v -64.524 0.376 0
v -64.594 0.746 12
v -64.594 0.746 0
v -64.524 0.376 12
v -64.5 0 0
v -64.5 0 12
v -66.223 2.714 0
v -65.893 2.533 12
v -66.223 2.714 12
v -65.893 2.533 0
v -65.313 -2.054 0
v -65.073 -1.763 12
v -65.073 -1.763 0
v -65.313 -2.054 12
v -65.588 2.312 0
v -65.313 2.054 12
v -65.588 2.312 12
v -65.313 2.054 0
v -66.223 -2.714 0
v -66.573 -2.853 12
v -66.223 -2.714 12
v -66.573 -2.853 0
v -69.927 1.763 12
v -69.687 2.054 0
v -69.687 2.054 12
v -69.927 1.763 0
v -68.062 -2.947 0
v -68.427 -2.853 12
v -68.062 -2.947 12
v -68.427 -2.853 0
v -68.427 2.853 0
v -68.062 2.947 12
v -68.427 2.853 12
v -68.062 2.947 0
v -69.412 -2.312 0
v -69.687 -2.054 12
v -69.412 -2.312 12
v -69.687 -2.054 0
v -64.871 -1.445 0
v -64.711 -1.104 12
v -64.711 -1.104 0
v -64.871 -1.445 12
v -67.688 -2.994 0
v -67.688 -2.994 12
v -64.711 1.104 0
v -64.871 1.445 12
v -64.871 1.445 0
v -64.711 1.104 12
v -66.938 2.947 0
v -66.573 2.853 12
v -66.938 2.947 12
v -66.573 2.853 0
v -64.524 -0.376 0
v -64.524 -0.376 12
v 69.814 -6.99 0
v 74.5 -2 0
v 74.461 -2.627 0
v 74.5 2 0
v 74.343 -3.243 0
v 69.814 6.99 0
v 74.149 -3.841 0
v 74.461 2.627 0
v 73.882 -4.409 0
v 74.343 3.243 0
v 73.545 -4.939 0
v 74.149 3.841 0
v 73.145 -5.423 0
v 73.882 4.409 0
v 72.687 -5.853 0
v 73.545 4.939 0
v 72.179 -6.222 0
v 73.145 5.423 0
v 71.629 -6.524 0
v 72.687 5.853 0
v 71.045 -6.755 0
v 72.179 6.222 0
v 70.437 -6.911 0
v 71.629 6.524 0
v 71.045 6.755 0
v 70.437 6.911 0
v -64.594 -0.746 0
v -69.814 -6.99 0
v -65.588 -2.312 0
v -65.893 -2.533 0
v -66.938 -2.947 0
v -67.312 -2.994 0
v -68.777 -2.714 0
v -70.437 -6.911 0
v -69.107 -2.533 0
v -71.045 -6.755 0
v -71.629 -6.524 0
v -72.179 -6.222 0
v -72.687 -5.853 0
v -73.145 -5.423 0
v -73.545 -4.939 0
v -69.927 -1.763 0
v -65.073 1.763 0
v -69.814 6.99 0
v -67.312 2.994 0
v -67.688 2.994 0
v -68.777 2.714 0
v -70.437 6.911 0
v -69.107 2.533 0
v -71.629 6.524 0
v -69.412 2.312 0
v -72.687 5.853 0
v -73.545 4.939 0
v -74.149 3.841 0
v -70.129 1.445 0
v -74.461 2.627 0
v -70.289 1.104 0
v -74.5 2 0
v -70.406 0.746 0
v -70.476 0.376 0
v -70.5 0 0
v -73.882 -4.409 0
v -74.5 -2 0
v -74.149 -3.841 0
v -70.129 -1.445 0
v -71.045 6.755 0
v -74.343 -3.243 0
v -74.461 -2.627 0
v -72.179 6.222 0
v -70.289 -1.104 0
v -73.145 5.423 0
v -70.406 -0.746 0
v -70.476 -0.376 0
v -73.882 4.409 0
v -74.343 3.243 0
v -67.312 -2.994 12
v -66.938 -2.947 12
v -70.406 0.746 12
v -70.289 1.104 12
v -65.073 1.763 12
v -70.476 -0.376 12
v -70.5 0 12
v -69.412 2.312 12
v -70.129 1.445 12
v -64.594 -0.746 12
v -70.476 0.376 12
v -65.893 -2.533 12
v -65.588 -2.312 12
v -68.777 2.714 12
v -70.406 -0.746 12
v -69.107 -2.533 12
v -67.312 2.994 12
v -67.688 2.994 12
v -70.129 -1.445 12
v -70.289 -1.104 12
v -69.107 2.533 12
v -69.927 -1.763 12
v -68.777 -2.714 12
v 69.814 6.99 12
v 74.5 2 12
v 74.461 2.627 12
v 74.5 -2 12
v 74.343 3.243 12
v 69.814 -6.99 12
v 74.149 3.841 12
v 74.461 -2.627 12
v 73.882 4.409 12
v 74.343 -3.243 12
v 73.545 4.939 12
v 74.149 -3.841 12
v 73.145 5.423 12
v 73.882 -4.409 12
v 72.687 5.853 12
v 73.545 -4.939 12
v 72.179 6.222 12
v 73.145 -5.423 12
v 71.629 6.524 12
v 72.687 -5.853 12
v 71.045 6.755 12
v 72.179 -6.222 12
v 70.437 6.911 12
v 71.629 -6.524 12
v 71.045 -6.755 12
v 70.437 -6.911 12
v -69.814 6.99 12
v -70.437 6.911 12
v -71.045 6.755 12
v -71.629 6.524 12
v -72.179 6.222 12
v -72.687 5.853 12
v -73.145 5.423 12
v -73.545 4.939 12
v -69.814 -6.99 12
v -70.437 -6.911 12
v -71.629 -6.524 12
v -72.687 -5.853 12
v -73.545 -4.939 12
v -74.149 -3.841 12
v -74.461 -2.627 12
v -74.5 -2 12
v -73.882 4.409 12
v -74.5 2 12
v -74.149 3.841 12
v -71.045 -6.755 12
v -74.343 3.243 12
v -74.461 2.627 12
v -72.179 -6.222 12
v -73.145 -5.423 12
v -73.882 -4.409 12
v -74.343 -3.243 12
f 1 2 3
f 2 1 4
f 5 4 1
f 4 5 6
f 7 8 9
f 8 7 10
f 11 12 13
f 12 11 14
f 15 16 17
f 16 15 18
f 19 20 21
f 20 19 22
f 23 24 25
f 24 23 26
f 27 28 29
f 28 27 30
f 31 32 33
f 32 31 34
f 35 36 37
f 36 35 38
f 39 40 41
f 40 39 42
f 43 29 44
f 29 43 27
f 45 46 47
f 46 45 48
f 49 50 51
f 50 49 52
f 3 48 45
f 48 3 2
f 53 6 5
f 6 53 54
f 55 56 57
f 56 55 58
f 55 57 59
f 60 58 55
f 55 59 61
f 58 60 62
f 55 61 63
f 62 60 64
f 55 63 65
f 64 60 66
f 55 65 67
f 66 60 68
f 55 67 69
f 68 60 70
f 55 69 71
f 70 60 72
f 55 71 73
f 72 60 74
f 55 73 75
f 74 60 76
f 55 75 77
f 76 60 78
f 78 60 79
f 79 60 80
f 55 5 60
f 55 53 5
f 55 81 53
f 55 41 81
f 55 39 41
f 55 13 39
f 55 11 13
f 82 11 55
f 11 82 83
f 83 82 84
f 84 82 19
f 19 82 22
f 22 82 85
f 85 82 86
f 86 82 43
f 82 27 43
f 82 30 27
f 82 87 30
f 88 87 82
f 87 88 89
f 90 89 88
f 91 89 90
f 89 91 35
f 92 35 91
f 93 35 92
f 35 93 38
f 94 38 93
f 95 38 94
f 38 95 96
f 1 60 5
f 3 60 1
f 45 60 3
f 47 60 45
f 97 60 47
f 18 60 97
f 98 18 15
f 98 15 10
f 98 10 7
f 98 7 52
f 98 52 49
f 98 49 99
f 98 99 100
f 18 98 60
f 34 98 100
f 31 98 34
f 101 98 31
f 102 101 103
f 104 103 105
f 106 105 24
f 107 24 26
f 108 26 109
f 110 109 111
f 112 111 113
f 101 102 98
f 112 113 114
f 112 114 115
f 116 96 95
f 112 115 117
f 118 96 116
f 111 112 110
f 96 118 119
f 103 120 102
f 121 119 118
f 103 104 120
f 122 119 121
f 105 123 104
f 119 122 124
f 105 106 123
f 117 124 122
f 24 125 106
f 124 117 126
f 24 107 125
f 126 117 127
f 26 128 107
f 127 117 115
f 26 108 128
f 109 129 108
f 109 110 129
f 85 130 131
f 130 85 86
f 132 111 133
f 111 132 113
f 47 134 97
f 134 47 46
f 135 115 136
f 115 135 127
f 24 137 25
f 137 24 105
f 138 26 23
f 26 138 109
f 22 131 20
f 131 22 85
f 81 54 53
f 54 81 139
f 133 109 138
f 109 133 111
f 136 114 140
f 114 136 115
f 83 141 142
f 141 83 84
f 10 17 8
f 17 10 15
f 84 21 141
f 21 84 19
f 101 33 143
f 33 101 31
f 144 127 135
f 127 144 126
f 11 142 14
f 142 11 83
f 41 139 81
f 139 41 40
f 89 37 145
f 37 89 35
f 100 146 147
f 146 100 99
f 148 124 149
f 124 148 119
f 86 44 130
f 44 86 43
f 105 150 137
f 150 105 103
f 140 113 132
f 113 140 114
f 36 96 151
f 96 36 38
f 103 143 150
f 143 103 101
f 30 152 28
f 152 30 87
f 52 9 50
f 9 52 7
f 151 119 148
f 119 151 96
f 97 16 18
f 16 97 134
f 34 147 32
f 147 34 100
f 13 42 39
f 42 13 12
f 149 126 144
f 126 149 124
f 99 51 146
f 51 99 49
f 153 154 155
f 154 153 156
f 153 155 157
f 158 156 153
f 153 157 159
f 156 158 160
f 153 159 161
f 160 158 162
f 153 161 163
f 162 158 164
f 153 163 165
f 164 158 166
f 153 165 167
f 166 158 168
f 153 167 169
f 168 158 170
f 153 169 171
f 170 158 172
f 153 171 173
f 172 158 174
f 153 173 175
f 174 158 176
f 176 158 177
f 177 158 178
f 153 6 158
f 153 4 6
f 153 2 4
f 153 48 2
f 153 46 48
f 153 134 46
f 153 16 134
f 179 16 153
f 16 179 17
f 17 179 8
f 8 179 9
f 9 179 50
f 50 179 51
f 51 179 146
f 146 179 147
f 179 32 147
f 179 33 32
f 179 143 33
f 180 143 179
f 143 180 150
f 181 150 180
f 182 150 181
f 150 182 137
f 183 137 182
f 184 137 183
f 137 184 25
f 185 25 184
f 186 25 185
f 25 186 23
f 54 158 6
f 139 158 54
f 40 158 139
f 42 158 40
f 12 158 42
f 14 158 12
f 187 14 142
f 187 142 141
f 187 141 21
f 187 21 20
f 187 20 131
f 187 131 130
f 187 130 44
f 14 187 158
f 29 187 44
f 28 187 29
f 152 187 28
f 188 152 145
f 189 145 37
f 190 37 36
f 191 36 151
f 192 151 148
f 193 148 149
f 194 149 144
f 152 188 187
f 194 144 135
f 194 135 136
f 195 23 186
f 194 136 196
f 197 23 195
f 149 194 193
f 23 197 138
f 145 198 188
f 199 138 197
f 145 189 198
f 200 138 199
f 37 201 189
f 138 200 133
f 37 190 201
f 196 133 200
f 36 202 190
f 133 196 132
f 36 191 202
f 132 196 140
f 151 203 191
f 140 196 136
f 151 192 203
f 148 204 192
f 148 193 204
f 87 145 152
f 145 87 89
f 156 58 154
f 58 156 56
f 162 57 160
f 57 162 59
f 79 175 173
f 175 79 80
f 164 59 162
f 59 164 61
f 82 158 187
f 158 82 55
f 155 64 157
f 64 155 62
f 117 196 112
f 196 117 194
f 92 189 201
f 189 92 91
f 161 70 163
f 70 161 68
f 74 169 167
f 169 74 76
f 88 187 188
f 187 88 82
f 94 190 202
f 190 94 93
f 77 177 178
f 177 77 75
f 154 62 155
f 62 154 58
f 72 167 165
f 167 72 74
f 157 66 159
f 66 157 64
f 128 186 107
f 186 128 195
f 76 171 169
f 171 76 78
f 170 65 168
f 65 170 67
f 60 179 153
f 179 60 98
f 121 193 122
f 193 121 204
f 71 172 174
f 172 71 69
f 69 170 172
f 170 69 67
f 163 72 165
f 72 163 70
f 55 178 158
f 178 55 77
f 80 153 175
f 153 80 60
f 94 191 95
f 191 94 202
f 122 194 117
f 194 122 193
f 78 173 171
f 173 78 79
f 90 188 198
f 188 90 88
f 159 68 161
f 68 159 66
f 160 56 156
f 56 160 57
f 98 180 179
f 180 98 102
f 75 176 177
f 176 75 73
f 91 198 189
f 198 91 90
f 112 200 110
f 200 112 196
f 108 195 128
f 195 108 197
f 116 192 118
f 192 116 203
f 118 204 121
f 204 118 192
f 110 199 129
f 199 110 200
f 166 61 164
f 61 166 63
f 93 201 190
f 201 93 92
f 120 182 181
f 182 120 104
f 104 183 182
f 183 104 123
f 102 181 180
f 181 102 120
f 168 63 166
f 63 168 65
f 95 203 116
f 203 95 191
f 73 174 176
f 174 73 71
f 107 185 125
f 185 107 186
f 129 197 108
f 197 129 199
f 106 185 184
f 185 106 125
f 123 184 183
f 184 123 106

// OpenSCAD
$fn = 50;


difference() {
	union() {
		hull() {
			translate(v = [-69.5000000000, 2.0000000000, 0]) {
				cylinder(h = 12, r = 5);
			}
			translate(v = [69.5000000000, 2.0000000000, 0]) {
				cylinder(h = 12, r = 5);
			}
			translate(v = [-69.5000000000, -2.0000000000, 0]) {
				cylinder(h = 12, r = 5);
			}
			translate(v = [69.5000000000, -2.0000000000, 0]) {
				cylinder(h = 12, r = 5);
			}
		}
	}
	union() {
		translate(v = [-67.5000000000, 0.0000000000, 0]) {
			cylinder(h = 12, r = 3.0000000000);
		}
		translate(v = [-67.5000000000, 0.0000000000, 0]) {
			cylinder(h = 12, r = 1.5000000000);
		}
		translate(v = [-67.5000000000, 0.0000000000, 0]) {
			cylinder(h = 12, r = 1.5000000000);
		}
		translate(v = [-67.5000000000, 0.0000000000, 0]) {
			cylinder(h = 12, r = 1.5000000000);
		}
	}
}
